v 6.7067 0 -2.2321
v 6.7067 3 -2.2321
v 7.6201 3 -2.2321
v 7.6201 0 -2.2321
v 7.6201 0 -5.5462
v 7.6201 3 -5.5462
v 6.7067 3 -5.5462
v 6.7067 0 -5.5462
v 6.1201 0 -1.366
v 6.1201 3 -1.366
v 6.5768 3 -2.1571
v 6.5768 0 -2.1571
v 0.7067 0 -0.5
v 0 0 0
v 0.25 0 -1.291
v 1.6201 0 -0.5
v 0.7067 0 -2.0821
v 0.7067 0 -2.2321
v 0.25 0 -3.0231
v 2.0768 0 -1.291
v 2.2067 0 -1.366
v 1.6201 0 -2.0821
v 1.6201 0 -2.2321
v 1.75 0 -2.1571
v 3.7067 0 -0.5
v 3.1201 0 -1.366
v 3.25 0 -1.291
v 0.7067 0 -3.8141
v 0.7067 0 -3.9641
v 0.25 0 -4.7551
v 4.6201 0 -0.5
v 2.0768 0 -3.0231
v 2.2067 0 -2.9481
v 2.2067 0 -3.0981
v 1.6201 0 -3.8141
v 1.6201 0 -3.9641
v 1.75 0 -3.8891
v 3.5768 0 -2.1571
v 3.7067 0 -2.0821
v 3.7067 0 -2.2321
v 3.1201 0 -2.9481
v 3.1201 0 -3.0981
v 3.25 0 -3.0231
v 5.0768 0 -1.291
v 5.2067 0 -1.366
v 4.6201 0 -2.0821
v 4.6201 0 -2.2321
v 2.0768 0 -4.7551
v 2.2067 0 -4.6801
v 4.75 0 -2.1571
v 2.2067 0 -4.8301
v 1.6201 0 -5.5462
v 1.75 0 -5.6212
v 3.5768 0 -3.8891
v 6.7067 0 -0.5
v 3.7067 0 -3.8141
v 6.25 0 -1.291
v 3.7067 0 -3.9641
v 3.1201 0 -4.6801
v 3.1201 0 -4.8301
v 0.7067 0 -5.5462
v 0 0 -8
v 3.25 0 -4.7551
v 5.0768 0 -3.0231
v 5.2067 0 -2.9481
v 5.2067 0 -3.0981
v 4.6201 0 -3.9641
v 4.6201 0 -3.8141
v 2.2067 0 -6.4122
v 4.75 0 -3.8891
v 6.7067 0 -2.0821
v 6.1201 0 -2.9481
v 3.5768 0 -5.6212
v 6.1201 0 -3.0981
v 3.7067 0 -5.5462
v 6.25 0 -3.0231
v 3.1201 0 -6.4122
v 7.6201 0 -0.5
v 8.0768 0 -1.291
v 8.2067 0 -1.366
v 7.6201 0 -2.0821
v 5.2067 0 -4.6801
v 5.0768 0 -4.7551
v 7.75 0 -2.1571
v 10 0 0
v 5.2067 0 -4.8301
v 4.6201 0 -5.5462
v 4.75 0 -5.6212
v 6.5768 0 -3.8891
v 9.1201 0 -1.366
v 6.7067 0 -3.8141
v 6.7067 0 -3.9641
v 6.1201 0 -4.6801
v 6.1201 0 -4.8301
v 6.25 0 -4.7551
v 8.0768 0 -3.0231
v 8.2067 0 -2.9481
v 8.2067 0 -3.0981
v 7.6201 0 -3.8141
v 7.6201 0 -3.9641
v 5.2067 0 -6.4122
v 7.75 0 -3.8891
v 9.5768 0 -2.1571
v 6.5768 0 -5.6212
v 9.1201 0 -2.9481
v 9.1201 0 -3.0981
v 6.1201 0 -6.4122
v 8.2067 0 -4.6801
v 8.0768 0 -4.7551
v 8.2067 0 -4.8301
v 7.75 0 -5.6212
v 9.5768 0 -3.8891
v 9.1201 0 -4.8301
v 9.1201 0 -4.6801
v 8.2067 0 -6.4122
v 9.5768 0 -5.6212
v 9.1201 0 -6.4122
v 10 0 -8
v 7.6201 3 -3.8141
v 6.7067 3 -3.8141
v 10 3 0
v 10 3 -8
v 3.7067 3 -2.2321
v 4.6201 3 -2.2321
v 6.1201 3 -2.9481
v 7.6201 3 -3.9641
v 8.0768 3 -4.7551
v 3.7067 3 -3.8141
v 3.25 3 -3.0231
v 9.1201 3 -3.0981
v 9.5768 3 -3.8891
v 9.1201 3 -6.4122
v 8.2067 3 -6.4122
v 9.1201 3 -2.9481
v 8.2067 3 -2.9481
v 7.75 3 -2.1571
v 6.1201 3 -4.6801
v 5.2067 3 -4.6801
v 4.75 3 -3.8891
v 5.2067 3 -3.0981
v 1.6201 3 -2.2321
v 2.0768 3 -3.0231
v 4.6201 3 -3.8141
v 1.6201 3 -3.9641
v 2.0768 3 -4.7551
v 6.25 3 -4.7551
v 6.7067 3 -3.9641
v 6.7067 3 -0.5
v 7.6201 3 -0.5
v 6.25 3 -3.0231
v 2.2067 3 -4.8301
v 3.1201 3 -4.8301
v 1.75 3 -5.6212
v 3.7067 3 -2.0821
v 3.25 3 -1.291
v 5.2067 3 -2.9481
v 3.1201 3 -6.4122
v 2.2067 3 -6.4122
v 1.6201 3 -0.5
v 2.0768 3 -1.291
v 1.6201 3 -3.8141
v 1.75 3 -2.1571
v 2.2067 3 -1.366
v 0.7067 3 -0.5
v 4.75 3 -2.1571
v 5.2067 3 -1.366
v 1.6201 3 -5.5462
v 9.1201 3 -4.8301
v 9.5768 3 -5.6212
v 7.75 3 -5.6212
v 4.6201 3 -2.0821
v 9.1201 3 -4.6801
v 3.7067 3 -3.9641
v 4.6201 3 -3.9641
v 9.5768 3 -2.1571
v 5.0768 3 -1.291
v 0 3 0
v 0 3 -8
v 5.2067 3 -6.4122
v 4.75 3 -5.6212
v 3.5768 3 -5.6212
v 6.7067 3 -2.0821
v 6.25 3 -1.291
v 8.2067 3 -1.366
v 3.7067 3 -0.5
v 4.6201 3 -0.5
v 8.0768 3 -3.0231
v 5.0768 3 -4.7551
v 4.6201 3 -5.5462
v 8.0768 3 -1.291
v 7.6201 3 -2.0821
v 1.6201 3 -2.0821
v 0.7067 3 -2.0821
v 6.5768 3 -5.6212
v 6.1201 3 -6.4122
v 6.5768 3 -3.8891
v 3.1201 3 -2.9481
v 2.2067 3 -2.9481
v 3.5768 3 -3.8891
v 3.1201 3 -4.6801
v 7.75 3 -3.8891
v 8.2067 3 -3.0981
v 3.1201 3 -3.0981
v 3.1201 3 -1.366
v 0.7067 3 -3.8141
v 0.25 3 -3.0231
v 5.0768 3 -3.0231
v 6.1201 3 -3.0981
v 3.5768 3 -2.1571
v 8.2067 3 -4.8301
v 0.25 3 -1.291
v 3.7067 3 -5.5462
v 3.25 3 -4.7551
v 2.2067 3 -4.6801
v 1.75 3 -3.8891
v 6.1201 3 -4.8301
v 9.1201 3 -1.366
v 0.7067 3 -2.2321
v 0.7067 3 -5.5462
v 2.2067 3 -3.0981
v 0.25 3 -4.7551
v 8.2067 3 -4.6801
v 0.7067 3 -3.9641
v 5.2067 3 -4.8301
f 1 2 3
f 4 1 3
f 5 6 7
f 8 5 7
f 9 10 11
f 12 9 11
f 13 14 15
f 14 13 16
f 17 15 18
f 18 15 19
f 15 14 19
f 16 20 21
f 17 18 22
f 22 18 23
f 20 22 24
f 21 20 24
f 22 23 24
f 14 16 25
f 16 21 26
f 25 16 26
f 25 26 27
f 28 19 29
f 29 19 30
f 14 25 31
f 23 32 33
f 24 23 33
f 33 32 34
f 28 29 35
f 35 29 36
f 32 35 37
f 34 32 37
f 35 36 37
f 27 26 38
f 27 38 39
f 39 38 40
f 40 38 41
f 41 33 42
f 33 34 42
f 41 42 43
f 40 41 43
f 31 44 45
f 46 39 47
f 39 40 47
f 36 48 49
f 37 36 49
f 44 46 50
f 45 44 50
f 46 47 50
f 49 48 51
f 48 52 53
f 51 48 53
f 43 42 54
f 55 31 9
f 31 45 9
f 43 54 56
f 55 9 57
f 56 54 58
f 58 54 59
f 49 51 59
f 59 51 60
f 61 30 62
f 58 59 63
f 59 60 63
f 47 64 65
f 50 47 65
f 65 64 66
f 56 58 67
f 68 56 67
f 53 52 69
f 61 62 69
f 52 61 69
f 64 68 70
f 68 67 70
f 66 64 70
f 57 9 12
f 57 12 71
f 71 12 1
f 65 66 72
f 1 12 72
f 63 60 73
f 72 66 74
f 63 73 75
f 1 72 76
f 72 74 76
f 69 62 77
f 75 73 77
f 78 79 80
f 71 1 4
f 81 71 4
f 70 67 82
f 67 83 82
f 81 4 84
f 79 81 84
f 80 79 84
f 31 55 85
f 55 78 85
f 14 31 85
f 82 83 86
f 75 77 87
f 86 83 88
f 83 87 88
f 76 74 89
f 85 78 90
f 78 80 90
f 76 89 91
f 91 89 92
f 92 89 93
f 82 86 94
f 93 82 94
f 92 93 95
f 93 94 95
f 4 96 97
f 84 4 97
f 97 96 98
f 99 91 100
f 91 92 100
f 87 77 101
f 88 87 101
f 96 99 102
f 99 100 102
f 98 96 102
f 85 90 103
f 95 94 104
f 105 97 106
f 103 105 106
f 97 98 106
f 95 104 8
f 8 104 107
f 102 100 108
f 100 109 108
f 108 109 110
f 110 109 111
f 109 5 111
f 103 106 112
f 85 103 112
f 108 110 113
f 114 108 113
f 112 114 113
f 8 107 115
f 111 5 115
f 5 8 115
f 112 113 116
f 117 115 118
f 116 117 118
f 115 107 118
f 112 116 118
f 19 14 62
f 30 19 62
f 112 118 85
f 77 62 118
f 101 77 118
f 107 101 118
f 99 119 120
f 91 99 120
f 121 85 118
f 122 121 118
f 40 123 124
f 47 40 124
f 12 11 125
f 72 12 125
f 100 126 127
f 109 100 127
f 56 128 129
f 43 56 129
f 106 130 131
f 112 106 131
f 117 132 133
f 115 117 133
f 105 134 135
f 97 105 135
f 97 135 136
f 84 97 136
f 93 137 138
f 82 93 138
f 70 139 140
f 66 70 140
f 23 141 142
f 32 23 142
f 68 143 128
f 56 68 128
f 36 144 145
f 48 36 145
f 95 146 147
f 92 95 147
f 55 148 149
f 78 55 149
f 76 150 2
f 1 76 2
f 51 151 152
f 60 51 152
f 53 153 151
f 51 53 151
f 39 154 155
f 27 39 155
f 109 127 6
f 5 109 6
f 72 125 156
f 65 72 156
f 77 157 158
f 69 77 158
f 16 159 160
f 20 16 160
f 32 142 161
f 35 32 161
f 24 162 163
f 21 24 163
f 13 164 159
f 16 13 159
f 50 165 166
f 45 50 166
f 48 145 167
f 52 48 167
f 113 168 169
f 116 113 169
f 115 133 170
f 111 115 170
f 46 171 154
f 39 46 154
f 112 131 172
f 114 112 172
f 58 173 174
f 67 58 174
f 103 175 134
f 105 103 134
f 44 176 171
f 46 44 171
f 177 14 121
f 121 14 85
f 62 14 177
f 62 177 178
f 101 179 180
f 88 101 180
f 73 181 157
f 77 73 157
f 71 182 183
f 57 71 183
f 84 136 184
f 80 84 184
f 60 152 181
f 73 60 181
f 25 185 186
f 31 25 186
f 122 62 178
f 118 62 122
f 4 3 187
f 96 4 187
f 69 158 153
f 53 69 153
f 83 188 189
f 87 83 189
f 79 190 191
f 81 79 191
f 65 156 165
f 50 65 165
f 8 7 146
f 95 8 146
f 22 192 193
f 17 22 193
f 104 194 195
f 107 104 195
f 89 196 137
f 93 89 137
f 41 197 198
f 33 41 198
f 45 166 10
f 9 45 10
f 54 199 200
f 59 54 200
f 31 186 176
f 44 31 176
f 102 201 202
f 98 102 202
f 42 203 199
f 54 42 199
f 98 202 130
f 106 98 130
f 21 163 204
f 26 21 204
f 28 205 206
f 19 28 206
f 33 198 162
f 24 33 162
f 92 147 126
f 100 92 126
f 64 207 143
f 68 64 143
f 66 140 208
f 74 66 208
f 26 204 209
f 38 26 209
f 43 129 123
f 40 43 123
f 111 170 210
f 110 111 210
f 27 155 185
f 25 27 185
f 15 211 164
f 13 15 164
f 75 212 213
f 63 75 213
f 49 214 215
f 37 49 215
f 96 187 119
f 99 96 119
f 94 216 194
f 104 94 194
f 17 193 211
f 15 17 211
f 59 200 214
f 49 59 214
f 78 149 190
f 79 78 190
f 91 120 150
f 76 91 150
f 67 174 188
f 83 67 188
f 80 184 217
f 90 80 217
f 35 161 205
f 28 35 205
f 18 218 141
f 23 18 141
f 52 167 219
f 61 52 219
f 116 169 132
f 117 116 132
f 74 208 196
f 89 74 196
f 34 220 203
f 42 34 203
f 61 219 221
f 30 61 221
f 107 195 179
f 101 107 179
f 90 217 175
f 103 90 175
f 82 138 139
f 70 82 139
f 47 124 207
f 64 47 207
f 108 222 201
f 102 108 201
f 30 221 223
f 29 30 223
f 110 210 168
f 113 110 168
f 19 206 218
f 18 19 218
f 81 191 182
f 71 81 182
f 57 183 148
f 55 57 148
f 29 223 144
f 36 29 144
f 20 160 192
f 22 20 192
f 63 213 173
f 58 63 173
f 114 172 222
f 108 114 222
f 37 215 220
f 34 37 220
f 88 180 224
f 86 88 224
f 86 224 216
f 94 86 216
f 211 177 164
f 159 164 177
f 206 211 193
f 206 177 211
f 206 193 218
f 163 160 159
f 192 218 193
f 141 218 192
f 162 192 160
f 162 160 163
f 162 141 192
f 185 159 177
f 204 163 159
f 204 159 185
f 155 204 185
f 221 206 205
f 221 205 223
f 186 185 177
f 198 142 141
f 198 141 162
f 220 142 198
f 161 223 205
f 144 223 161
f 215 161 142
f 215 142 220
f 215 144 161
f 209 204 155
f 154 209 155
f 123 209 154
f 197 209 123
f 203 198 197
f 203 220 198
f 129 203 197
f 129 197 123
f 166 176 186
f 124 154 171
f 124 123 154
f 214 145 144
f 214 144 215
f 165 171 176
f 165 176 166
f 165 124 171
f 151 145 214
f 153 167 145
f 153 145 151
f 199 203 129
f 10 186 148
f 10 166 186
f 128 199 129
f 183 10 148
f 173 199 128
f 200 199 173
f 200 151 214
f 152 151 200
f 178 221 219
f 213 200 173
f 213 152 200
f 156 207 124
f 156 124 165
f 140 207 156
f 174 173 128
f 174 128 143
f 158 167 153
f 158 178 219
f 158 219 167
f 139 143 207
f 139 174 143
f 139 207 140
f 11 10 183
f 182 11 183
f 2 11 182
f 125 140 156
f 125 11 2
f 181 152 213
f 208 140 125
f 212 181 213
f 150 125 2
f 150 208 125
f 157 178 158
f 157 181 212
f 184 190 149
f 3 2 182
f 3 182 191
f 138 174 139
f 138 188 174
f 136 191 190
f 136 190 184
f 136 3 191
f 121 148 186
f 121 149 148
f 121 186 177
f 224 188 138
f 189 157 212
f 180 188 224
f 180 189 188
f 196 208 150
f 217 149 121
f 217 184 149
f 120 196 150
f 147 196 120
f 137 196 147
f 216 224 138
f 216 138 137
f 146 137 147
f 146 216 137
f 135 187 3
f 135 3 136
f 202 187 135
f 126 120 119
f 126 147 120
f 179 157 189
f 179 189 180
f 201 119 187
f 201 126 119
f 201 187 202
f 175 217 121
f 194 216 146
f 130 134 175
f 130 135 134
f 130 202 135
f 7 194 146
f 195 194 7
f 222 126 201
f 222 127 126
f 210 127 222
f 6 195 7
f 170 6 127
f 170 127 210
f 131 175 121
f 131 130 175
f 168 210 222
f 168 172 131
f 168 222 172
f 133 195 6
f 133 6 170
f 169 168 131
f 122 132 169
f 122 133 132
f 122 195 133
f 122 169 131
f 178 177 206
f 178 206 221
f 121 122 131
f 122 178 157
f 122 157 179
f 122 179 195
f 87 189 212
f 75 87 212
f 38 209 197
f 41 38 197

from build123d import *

# Parameters (mm, degrees)
SKETCH1_W            = 10
SKETCH1_H            = 8
BOSS_EXTRUDE1_DEPTH  = 3
CUT_EXTRUDE1_REACH   = 15.153
LPATTERN2_COUNT      = 3
LPATTERN2_PITCH      = 3
LPATTERN2_COUNT_DIR2 = 3
LPATTERN2_PITCH_DIR2 = 1.732050808


with BuildPart() as part:
    # Sketch1 → Boss-Extrude1 (new body)
    with BuildSketch(Plane(origin=(0, 0, 0), x_dir=(1, 0, 0), z_dir=(0, 1, 0))):
        with Locations((5, 4)):
            Rectangle(SKETCH1_W, SKETCH1_H)
    extrude(amount=BOSS_EXTRUDE1_DEPTH)

    # Sketch2 → Cut-Extrude1 (cut, up to next)
    with BuildSketch(Plane(origin=(0, 3, 0), x_dir=(1, 0, 0), z_dir=(0, 1, 0)), mode=Mode.PRIVATE) as cut_extrude1_sk1:
        Polygon((2.076794919, 1.291025404), (1.620096189, 2.082050808), (0.70669873, 2.082050808), (0.25, 1.291025404), (0.70669873, 0.5), (1.620096189, 0.5), align=None)
    cut_extrude1_tool1 = extrude(cut_extrude1_sk1.sketch, amount=-CUT_EXTRUDE1_REACH, mode=Mode.PRIVATE) & part.part
    # Sketch2 → Cut-Extrude1 (cut, up to next)
    with BuildSketch(Plane(origin=(0, 3, 0), x_dir=(1, 0, 0), z_dir=(0, 1, 0)), mode=Mode.PRIVATE) as cut_extrude1_sk2:
        Polygon((3.576794919, 2.157050808), (3.120096189, 2.948076211), (2.20669873, 2.948076211), (1.75, 2.157050808), (2.20669873, 1.366025404), (3.120096189, 1.366025404), align=None)
    cut_extrude1_tool2 = extrude(cut_extrude1_sk2.sketch, amount=-CUT_EXTRUDE1_REACH, mode=Mode.PRIVATE) & part.part
    cut_extrude1_1 = cut_extrude1_tool1.solids().sort_by_distance((1.163397, 3, -1.291025))[0]
    add(cut_extrude1_1, mode=Mode.SUBTRACT)
    cut_extrude1_2 = cut_extrude1_tool2.solids().sort_by_distance((2.663397, 3, -2.157051))[0]
    add(cut_extrude1_2, mode=Mode.SUBTRACT)
    cut_extrude1 = cut_extrude1_1 + cut_extrude1_2  # Cut-Extrude1 as one shape, for the pattern or mirror that repeats it

    # LPattern2: Cut-Extrude1 3 × 3
    with Locations(*[(i * LPATTERN2_PITCH, 0, -j * LPATTERN2_PITCH_DIR2) for i in range(LPATTERN2_COUNT) for j in range(LPATTERN2_COUNT_DIR2) if (i, j) != (0, 0)]):
        add(cut_extrude1, mode=Mode.SUBTRACT)


solid = part.part
